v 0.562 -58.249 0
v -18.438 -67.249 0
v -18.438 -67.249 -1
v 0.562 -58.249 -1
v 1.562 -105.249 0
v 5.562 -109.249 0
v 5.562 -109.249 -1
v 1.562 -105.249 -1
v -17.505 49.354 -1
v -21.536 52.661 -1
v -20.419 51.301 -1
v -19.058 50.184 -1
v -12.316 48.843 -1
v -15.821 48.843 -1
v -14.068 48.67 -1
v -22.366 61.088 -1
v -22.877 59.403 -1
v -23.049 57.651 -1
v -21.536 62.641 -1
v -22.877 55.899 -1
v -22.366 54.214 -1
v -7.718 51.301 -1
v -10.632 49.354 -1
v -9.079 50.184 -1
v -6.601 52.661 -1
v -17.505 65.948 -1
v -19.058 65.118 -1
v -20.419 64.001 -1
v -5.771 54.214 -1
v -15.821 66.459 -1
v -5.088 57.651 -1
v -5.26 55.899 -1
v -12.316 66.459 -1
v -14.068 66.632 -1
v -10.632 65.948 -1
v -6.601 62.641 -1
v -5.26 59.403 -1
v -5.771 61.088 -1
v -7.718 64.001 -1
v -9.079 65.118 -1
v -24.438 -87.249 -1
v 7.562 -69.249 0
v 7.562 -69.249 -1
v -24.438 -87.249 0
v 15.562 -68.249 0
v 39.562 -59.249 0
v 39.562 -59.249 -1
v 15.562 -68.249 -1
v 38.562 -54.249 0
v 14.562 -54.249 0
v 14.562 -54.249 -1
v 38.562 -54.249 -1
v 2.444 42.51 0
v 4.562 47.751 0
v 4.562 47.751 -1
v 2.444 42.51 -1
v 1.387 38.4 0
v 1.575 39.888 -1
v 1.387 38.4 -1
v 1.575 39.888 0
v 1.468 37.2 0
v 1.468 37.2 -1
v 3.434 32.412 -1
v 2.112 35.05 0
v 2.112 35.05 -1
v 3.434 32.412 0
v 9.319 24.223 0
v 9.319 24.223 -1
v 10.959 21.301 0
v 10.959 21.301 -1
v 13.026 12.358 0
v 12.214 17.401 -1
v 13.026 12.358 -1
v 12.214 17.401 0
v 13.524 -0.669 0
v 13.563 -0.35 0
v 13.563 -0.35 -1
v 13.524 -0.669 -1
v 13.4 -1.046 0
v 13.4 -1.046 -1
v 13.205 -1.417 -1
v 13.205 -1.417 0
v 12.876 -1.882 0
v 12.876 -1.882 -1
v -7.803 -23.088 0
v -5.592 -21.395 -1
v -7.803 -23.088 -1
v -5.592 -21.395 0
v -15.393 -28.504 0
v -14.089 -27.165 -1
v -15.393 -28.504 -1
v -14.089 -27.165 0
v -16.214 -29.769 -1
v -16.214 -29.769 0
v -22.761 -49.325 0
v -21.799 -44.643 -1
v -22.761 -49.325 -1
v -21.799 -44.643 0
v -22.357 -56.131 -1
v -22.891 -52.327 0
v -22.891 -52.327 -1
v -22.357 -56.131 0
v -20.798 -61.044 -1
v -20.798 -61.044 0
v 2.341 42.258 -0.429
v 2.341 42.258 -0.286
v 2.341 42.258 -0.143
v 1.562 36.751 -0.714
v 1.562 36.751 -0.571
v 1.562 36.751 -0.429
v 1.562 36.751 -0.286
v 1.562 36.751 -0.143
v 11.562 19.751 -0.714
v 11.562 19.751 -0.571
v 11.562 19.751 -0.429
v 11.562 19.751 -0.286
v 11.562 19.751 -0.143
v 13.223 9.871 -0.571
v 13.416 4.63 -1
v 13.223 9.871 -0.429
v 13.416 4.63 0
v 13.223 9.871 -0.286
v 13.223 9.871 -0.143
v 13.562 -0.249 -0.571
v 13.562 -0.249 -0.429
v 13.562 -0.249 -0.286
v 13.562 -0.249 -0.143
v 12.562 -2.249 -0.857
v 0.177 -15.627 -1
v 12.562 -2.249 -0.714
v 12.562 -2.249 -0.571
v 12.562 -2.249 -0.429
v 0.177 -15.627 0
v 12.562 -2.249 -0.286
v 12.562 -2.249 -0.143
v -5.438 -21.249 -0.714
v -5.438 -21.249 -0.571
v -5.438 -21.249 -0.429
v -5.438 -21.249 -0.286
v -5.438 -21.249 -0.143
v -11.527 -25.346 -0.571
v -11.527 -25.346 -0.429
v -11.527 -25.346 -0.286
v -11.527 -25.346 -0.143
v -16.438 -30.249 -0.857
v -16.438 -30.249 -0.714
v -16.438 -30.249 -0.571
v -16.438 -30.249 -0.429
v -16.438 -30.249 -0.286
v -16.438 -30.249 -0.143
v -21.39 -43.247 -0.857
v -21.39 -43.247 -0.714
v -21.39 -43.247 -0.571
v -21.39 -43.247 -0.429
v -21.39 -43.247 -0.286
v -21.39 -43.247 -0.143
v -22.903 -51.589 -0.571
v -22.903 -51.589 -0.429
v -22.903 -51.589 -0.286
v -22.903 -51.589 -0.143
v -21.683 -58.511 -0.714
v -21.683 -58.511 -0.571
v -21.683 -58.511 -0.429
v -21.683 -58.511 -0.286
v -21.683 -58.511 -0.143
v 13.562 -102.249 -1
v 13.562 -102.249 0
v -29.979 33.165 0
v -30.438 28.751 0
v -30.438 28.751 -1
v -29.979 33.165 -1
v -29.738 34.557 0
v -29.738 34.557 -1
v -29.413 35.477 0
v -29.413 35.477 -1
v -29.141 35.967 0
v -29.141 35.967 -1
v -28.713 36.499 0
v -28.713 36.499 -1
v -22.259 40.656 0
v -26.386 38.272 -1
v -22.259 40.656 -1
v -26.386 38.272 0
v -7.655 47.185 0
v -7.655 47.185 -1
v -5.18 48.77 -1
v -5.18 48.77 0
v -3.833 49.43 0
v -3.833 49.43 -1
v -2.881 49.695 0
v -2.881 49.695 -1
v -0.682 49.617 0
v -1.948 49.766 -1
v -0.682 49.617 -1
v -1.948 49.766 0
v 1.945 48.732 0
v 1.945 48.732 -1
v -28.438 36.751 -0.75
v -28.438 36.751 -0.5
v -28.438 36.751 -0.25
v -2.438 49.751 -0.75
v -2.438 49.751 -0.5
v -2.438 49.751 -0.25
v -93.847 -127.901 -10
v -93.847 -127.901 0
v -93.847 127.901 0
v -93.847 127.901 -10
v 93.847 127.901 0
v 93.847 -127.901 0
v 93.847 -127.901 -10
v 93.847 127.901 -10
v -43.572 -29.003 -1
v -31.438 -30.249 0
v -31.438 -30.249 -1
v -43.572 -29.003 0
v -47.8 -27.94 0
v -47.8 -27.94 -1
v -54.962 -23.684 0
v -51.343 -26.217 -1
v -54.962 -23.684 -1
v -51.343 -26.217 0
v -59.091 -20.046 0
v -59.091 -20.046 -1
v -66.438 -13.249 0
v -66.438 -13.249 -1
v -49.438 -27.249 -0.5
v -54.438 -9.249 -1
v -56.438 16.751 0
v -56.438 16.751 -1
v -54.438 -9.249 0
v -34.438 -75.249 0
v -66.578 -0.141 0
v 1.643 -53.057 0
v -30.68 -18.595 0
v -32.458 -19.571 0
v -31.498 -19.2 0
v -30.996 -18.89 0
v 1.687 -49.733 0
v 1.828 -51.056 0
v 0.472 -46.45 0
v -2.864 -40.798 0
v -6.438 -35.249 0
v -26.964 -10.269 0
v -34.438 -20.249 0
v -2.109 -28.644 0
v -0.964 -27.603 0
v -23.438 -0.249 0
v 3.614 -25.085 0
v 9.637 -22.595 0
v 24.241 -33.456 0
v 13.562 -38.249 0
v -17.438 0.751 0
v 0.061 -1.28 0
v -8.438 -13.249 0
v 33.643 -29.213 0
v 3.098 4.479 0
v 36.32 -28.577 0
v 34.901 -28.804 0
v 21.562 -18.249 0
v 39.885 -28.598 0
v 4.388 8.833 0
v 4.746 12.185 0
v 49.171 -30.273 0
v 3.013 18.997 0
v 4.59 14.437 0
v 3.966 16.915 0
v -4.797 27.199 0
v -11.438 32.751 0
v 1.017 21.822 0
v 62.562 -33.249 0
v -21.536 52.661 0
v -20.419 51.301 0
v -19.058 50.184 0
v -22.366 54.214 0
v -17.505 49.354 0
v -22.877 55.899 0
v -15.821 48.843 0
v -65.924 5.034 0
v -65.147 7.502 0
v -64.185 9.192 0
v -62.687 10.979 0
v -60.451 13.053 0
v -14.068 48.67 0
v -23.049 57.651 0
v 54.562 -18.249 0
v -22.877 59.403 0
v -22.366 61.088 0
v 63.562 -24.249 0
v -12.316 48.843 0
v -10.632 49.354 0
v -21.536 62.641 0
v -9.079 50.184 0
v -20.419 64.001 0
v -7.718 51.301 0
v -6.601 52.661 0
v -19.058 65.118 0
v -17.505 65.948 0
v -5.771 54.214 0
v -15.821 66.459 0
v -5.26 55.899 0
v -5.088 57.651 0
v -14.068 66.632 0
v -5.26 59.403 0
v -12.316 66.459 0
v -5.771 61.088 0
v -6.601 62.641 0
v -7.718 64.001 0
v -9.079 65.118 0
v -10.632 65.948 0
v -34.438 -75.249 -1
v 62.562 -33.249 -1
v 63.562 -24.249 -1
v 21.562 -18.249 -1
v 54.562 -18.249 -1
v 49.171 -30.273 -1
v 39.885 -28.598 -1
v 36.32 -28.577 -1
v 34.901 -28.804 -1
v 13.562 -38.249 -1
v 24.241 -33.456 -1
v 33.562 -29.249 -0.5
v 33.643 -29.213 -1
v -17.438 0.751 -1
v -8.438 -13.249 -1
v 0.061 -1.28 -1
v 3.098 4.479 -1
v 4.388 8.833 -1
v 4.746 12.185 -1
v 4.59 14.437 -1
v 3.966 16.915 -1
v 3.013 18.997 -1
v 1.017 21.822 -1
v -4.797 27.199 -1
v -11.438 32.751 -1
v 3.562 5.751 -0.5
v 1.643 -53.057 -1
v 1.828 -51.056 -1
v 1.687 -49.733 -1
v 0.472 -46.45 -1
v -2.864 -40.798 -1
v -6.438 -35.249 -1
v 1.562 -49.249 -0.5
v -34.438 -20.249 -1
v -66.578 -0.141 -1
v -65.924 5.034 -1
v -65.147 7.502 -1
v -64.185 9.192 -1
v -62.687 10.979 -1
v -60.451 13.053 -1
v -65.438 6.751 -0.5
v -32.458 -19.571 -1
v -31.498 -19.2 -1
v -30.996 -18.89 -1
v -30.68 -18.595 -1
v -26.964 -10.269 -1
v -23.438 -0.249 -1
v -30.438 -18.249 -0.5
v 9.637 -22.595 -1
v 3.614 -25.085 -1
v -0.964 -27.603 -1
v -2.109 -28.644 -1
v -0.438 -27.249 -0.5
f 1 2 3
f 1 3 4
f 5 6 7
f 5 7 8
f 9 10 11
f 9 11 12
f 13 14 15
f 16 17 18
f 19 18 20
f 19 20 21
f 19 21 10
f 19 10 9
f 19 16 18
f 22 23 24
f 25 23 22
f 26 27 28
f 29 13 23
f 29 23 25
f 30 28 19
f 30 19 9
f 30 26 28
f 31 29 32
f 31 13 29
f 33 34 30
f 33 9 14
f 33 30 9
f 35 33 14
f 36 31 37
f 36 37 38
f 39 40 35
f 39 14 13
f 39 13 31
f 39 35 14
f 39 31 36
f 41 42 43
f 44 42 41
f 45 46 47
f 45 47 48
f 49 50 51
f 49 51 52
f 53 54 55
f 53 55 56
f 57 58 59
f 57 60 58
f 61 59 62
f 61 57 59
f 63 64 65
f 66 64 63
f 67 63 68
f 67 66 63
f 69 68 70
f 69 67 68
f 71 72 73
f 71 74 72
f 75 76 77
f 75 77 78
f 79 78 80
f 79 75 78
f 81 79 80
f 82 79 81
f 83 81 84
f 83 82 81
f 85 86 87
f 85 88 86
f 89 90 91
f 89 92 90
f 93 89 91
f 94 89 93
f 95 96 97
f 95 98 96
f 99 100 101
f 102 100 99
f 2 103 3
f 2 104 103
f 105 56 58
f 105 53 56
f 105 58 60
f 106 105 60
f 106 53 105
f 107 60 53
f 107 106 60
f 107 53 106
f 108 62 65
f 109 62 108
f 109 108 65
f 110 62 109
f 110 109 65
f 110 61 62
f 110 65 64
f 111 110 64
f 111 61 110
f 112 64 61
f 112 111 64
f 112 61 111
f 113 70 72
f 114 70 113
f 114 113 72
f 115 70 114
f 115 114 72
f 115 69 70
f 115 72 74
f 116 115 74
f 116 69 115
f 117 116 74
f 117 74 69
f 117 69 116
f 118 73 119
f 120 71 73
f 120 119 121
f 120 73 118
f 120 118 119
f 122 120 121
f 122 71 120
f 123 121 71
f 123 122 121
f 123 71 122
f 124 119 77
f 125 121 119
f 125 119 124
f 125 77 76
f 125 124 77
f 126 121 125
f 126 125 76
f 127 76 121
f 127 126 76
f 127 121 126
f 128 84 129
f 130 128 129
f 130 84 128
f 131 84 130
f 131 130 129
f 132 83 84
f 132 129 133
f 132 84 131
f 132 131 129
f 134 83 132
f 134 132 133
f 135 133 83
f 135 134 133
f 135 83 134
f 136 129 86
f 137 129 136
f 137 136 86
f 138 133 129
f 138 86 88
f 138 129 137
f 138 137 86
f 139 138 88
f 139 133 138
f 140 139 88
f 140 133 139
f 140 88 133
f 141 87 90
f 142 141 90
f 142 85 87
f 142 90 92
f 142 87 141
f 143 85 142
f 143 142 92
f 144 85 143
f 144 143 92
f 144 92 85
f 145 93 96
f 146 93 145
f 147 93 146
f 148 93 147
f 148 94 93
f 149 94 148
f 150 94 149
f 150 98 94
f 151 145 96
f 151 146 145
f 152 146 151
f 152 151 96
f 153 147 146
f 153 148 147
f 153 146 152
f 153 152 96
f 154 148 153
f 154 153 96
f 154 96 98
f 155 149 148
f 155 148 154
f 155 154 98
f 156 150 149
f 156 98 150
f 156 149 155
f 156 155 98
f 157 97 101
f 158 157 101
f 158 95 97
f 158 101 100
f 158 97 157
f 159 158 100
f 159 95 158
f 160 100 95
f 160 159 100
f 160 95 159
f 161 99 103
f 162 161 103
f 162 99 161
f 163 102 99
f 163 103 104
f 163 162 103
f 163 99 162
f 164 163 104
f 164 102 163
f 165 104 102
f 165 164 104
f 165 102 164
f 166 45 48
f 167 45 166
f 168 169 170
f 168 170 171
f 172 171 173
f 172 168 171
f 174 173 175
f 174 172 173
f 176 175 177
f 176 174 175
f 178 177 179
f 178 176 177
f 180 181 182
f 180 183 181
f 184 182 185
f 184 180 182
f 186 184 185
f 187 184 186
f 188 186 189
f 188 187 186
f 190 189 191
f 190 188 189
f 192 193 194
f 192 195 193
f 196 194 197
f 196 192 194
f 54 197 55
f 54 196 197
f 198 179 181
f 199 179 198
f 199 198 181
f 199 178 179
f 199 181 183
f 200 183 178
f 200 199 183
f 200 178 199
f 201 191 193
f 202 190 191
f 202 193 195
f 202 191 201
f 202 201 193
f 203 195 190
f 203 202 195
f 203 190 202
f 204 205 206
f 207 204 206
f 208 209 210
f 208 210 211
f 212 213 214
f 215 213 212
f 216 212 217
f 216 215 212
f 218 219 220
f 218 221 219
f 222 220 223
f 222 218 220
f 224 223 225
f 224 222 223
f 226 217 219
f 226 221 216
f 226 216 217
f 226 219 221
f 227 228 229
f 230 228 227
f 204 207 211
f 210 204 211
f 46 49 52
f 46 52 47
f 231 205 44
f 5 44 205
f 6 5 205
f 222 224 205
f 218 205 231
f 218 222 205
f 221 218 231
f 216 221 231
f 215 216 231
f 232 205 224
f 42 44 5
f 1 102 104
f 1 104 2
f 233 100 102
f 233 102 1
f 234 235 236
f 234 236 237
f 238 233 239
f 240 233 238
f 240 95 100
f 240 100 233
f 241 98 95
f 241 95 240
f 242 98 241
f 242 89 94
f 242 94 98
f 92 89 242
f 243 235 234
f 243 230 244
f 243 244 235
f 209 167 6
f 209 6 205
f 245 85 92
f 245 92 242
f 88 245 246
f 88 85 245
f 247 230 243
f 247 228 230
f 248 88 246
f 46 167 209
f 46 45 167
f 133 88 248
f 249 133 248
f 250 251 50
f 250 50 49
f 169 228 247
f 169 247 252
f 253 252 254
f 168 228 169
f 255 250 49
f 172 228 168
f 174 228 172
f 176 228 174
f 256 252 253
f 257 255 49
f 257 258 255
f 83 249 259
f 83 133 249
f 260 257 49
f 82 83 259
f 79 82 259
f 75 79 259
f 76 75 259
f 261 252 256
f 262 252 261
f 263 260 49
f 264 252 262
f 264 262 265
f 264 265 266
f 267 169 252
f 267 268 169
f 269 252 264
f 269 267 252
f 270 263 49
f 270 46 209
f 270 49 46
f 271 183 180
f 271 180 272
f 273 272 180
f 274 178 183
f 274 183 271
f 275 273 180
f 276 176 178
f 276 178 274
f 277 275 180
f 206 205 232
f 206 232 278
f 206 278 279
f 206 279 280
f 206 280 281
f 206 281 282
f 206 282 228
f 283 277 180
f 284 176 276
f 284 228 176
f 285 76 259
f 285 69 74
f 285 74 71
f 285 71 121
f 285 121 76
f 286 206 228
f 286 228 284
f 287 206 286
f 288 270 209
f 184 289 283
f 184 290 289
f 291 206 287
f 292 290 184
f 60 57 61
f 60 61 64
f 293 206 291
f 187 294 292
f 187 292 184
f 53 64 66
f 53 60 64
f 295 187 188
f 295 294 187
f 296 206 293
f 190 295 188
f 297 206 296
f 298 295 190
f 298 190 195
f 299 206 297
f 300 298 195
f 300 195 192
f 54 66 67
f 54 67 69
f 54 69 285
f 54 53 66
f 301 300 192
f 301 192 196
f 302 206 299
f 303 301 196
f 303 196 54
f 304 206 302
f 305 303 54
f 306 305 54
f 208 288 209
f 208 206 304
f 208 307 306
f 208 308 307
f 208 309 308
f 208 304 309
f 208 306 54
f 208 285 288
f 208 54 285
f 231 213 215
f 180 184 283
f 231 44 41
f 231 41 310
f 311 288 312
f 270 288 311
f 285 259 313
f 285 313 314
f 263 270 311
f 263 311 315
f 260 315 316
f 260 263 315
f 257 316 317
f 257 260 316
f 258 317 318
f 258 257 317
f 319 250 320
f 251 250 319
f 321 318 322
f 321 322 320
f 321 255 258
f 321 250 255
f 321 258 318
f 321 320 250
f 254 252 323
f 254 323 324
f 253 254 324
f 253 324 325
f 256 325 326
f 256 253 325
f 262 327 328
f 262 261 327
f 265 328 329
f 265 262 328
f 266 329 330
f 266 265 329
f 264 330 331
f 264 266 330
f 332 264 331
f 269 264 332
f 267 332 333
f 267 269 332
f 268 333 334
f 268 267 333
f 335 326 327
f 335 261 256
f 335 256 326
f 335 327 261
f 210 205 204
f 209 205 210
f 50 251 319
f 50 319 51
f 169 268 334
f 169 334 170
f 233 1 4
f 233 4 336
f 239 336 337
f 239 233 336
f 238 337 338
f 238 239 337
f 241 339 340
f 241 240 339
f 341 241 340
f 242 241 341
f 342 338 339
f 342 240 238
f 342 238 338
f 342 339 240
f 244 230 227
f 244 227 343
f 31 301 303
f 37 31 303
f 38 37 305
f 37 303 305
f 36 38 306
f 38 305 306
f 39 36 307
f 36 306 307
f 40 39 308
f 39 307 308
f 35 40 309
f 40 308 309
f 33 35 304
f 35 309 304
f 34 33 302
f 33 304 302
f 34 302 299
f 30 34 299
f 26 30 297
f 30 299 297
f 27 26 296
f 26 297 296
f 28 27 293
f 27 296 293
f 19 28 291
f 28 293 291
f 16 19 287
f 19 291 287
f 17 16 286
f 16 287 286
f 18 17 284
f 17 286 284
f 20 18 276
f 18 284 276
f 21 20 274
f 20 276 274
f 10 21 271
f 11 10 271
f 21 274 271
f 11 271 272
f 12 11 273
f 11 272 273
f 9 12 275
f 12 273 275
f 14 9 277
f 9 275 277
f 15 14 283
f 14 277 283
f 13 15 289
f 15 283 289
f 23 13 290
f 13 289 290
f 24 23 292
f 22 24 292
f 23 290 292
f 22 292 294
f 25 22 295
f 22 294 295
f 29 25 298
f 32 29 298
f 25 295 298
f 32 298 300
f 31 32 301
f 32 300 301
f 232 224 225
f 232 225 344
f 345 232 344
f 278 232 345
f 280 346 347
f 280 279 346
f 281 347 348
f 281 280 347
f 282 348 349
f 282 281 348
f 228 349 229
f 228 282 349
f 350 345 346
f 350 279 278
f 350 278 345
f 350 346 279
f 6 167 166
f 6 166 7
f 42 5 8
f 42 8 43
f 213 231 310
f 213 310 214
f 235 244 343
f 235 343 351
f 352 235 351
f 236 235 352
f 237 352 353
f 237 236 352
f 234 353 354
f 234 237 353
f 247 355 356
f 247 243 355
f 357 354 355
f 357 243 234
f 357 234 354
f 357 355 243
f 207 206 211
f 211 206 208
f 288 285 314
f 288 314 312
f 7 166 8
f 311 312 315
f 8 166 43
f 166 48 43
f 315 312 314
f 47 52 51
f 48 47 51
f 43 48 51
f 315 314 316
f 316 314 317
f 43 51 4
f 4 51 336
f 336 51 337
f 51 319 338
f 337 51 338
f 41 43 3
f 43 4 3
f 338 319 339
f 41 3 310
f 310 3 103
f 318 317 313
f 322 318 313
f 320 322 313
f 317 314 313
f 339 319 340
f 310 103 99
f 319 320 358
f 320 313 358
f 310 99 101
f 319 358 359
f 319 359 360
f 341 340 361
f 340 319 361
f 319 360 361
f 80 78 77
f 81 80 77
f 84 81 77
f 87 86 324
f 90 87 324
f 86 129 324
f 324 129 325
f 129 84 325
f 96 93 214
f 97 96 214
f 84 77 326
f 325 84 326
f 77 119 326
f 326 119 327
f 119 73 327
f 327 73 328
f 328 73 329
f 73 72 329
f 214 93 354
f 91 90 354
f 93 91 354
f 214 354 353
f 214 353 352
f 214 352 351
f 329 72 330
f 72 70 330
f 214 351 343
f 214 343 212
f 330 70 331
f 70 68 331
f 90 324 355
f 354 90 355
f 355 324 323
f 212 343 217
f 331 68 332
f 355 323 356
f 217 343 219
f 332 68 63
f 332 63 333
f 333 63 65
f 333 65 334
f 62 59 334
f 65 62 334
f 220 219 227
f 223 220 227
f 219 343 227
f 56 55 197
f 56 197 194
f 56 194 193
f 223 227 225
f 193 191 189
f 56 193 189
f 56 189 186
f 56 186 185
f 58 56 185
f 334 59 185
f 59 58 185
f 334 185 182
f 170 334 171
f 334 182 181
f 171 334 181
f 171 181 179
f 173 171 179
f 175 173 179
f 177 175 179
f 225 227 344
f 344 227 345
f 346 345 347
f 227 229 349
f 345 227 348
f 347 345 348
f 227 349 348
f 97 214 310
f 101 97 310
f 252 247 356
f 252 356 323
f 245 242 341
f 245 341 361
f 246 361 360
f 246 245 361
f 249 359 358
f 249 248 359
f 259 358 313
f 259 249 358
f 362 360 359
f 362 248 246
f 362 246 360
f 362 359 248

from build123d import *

# Parameters (mm, degrees)
ESQUISSE2_W             = 187.693077266
ESQUISSE2_H             = 255.801785532
BOSS_EXTRU_1_DEPTH      = 10
ESQUISSE1_R             = 8.980927744
ENL_V_MAT_EXTRU_1_DEPTH = 1


with BuildPart() as part:
    # Esquisse2 → Boss.-Extru.1 (new body)
    with BuildSketch(Plane.XY):
        Rectangle(ESQUISSE2_W, ESQUISSE2_H)
    extrude(amount=-BOSS_EXTRU_1_DEPTH)

    # Esquisse1 → Enlèv. mat.-Extru.1 (cut)
    with BuildSketch(Plane.XY):
        with Locations((-14.068497164, 57.651010039)):
            Circle(ESQUISSE1_R)
        with BuildLine():
            Line((-18.438094574, -67.249269982), (0.561905426, -58.249269982))
            add(Edge.make_bspline(
                [(0.561905426, -58.249269982), (0.895238759, -55.249269982), (2.440765615, -52.136953462), (1.561905426, -49.249269982), (-0.003041236, -44.107302379), (-3.771427907, -39.915936649), (-6.438094574, -35.249269982)],
                knots=[0, 0, 0, 0, 1, 1, 1, 2, 2, 2, 2], degree=3))
            add(Edge.make_bspline(
                [(-6.438094574, -35.249269982), (-4.438094574, -32.582603316), (-3.287386291, -28.979197096), (-0.438094574, -27.249269982), (6.334594522, -23.137280174), (14.228572093, -21.249269982), (21.561905426, -18.249269982)],
                knots=[0, 0, 0, 0, 1, 1, 1, 2, 2, 2, 2], degree=3))
            Line((21.561905426, -18.249269982), (54.561905426, -18.249269982))
            Line((54.561905426, -18.249269982), (63.561905426, -24.249269982))
            Line((63.561905426, -24.249269982), (62.561905426, -33.249269982))
            add(Edge.make_bspline(
                [(62.561905426, -33.249269982), (54.348122416, -32.222547106), (39.619427755, -26.495850742), (33.561905426, -29.249269982), (26.906606899, -32.274405676), (20.228572093, -35.249269982), (13.561905426, -38.249269982)],
                knots=[0, 0, 0, 0, 1, 1, 1, 2, 2, 2, 2], degree=3))
            Line((13.561905426, -38.249269982), (14.561905426, -54.249269982))
            Line((14.561905426, -54.249269982), (38.561905426, -54.249269982))
            Line((38.561905426, -54.249269982), (39.561905426, -59.249269982))
            Line((39.561905426, -59.249269982), (15.561905426, -68.249269982))
            Line((15.561905426, -68.249269982), (13.561905426, -102.249269982))
            Line((13.561905426, -102.249269982), (5.561905426, -109.249269982))
            Line((5.561905426, -109.249269982), (1.561905426, -105.249269982))
            Line((1.561905426, -105.249269982), (7.561905426, -69.249269982))
            Line((7.561905426, -69.249269982), (-24.438094574, -87.249269982))
            Line((-24.438094574, -87.249269982), (-34.438094574, -75.249269982))
            Line((-34.438094574, -75.249269982), (-31.438094574, -30.249269982))
            add(Edge.make_bspline(
                [(-31.438094574, -30.249269982), (-37.438094574, -29.249269982), (-43.966600051, -29.906853036), (-49.438094574, -27.249269982), (-56.041298676, -24.041999418), (-60.771427907, -17.915936649), (-66.438094574, -13.249269982)],
                knots=[0, 0, 0, 0, 1, 1, 1, 2, 2, 2, 2], degree=3))
            add(Edge.make_bspline(
                [(-66.438094574, -13.249269982), (-66.104761241, -6.582603316), (-67.548913267, 0.418273938), (-65.438094574, 6.750730018), (-64.019958082, 11.005139495), (-59.438094574, 13.417396684), (-56.438094574, 16.750730018)],
                knots=[0, 0, 0, 0, 1, 1, 1, 2, 2, 2, 2], degree=3))
            Line((-56.438094574, 16.750730018), (-54.438094574, -9.249269982))
            Line((-54.438094574, -9.249269982), (-34.438094574, -20.249269982))
            add(Edge.make_bspline(
                [(-34.438094574, -20.249269982), (-33.104761241, -19.582603316), (-31.15649663, -19.555455539), (-30.438094574, -18.249269982), (-27.335628903, -12.608423308), (-25.771427907, -6.249269982), (-23.438094574, -0.249269982)],
                knots=[0, 0, 0, 0, 1, 1, 1, 2, 2, 2, 2], degree=3))
            Line((-23.438094574, -0.249269982), (-17.438094574, 0.750730018))
            Line((-17.438094574, 0.750730018), (-8.438094574, -13.249269982))
            add(Edge.make_bspline(
                [(-8.438094574, -13.249269982), (-4.438094574, -6.915936649), (1.193127025, -1.355605184), (3.561905426, 5.750730018), (8.39884273, 20.261541929), (-2.572357609, 24.518259979), (-11.438094574, 32.750730018)],
                knots=[0, 0, 0, 0, 1, 1, 1, 2, 2, 2, 2], degree=3))
            Line((-11.438094574, 32.750730018), (-30.438094574, 28.750730018))
            add(Edge.make_bspline(
                [(-30.438094574, 28.750730018), (-29.771427907, 31.417396684), (-30.565499704, 35.010125821), (-28.438094574, 36.750730018), (-22.669357465, 41.470605834), (-15.104761241, 43.417396684), (-8.438094574, 46.750730018), (-6.438094574, 47.750730018), (-4.667576181, 49.579231433), (-2.438094574, 49.750730018), (-0.018539167, 49.936849664), (2.228572093, 48.417396684), (4.561905426, 47.750730018)],
                knots=[0, 0, 0, 0, 1, 1, 1, 2, 2, 2, 3, 3, 3, 4, 4, 4, 4], degree=3))
            add(Edge.make_bspline(
                [(4.561905426, 47.750730018), (3.561905426, 44.084063351), (0.640128228, 40.437838809), (1.561905426, 36.750730018), (3.156422174, 30.372663025), (9.533684179, 26.004412197), (11.561905426, 19.750730018), (13.628861322, 13.377616005), (13.257677863, 6.443736403), (13.561905426, -0.249269982), (13.595750298, -0.99385717), (13.061974693, -1.696561846), (12.561905426, -2.249269982), (6.708744727, -8.71855286), (0.838084785, -15.189510601), (-5.438094574, -21.249269982), (-8.846299856, -24.539950945), (-14.599652494, -25.882970043), (-16.438094574, -30.249269982), (-25.647412644, -52.121400398), (-23.800738795, -52.948885392), (-18.438094574, -67.249269982)],
                knots=[0, 0, 0, 0, 1, 1, 1, 2, 2, 2, 3, 3, 3, 4, 4, 4, 5, 5, 5, 6, 6, 6, 7, 7, 7, 7], degree=3))
        make_face()
    extrude(amount=-ENL_V_MAT_EXTRU_1_DEPTH, mode=Mode.SUBTRACT)


solid = part.part
